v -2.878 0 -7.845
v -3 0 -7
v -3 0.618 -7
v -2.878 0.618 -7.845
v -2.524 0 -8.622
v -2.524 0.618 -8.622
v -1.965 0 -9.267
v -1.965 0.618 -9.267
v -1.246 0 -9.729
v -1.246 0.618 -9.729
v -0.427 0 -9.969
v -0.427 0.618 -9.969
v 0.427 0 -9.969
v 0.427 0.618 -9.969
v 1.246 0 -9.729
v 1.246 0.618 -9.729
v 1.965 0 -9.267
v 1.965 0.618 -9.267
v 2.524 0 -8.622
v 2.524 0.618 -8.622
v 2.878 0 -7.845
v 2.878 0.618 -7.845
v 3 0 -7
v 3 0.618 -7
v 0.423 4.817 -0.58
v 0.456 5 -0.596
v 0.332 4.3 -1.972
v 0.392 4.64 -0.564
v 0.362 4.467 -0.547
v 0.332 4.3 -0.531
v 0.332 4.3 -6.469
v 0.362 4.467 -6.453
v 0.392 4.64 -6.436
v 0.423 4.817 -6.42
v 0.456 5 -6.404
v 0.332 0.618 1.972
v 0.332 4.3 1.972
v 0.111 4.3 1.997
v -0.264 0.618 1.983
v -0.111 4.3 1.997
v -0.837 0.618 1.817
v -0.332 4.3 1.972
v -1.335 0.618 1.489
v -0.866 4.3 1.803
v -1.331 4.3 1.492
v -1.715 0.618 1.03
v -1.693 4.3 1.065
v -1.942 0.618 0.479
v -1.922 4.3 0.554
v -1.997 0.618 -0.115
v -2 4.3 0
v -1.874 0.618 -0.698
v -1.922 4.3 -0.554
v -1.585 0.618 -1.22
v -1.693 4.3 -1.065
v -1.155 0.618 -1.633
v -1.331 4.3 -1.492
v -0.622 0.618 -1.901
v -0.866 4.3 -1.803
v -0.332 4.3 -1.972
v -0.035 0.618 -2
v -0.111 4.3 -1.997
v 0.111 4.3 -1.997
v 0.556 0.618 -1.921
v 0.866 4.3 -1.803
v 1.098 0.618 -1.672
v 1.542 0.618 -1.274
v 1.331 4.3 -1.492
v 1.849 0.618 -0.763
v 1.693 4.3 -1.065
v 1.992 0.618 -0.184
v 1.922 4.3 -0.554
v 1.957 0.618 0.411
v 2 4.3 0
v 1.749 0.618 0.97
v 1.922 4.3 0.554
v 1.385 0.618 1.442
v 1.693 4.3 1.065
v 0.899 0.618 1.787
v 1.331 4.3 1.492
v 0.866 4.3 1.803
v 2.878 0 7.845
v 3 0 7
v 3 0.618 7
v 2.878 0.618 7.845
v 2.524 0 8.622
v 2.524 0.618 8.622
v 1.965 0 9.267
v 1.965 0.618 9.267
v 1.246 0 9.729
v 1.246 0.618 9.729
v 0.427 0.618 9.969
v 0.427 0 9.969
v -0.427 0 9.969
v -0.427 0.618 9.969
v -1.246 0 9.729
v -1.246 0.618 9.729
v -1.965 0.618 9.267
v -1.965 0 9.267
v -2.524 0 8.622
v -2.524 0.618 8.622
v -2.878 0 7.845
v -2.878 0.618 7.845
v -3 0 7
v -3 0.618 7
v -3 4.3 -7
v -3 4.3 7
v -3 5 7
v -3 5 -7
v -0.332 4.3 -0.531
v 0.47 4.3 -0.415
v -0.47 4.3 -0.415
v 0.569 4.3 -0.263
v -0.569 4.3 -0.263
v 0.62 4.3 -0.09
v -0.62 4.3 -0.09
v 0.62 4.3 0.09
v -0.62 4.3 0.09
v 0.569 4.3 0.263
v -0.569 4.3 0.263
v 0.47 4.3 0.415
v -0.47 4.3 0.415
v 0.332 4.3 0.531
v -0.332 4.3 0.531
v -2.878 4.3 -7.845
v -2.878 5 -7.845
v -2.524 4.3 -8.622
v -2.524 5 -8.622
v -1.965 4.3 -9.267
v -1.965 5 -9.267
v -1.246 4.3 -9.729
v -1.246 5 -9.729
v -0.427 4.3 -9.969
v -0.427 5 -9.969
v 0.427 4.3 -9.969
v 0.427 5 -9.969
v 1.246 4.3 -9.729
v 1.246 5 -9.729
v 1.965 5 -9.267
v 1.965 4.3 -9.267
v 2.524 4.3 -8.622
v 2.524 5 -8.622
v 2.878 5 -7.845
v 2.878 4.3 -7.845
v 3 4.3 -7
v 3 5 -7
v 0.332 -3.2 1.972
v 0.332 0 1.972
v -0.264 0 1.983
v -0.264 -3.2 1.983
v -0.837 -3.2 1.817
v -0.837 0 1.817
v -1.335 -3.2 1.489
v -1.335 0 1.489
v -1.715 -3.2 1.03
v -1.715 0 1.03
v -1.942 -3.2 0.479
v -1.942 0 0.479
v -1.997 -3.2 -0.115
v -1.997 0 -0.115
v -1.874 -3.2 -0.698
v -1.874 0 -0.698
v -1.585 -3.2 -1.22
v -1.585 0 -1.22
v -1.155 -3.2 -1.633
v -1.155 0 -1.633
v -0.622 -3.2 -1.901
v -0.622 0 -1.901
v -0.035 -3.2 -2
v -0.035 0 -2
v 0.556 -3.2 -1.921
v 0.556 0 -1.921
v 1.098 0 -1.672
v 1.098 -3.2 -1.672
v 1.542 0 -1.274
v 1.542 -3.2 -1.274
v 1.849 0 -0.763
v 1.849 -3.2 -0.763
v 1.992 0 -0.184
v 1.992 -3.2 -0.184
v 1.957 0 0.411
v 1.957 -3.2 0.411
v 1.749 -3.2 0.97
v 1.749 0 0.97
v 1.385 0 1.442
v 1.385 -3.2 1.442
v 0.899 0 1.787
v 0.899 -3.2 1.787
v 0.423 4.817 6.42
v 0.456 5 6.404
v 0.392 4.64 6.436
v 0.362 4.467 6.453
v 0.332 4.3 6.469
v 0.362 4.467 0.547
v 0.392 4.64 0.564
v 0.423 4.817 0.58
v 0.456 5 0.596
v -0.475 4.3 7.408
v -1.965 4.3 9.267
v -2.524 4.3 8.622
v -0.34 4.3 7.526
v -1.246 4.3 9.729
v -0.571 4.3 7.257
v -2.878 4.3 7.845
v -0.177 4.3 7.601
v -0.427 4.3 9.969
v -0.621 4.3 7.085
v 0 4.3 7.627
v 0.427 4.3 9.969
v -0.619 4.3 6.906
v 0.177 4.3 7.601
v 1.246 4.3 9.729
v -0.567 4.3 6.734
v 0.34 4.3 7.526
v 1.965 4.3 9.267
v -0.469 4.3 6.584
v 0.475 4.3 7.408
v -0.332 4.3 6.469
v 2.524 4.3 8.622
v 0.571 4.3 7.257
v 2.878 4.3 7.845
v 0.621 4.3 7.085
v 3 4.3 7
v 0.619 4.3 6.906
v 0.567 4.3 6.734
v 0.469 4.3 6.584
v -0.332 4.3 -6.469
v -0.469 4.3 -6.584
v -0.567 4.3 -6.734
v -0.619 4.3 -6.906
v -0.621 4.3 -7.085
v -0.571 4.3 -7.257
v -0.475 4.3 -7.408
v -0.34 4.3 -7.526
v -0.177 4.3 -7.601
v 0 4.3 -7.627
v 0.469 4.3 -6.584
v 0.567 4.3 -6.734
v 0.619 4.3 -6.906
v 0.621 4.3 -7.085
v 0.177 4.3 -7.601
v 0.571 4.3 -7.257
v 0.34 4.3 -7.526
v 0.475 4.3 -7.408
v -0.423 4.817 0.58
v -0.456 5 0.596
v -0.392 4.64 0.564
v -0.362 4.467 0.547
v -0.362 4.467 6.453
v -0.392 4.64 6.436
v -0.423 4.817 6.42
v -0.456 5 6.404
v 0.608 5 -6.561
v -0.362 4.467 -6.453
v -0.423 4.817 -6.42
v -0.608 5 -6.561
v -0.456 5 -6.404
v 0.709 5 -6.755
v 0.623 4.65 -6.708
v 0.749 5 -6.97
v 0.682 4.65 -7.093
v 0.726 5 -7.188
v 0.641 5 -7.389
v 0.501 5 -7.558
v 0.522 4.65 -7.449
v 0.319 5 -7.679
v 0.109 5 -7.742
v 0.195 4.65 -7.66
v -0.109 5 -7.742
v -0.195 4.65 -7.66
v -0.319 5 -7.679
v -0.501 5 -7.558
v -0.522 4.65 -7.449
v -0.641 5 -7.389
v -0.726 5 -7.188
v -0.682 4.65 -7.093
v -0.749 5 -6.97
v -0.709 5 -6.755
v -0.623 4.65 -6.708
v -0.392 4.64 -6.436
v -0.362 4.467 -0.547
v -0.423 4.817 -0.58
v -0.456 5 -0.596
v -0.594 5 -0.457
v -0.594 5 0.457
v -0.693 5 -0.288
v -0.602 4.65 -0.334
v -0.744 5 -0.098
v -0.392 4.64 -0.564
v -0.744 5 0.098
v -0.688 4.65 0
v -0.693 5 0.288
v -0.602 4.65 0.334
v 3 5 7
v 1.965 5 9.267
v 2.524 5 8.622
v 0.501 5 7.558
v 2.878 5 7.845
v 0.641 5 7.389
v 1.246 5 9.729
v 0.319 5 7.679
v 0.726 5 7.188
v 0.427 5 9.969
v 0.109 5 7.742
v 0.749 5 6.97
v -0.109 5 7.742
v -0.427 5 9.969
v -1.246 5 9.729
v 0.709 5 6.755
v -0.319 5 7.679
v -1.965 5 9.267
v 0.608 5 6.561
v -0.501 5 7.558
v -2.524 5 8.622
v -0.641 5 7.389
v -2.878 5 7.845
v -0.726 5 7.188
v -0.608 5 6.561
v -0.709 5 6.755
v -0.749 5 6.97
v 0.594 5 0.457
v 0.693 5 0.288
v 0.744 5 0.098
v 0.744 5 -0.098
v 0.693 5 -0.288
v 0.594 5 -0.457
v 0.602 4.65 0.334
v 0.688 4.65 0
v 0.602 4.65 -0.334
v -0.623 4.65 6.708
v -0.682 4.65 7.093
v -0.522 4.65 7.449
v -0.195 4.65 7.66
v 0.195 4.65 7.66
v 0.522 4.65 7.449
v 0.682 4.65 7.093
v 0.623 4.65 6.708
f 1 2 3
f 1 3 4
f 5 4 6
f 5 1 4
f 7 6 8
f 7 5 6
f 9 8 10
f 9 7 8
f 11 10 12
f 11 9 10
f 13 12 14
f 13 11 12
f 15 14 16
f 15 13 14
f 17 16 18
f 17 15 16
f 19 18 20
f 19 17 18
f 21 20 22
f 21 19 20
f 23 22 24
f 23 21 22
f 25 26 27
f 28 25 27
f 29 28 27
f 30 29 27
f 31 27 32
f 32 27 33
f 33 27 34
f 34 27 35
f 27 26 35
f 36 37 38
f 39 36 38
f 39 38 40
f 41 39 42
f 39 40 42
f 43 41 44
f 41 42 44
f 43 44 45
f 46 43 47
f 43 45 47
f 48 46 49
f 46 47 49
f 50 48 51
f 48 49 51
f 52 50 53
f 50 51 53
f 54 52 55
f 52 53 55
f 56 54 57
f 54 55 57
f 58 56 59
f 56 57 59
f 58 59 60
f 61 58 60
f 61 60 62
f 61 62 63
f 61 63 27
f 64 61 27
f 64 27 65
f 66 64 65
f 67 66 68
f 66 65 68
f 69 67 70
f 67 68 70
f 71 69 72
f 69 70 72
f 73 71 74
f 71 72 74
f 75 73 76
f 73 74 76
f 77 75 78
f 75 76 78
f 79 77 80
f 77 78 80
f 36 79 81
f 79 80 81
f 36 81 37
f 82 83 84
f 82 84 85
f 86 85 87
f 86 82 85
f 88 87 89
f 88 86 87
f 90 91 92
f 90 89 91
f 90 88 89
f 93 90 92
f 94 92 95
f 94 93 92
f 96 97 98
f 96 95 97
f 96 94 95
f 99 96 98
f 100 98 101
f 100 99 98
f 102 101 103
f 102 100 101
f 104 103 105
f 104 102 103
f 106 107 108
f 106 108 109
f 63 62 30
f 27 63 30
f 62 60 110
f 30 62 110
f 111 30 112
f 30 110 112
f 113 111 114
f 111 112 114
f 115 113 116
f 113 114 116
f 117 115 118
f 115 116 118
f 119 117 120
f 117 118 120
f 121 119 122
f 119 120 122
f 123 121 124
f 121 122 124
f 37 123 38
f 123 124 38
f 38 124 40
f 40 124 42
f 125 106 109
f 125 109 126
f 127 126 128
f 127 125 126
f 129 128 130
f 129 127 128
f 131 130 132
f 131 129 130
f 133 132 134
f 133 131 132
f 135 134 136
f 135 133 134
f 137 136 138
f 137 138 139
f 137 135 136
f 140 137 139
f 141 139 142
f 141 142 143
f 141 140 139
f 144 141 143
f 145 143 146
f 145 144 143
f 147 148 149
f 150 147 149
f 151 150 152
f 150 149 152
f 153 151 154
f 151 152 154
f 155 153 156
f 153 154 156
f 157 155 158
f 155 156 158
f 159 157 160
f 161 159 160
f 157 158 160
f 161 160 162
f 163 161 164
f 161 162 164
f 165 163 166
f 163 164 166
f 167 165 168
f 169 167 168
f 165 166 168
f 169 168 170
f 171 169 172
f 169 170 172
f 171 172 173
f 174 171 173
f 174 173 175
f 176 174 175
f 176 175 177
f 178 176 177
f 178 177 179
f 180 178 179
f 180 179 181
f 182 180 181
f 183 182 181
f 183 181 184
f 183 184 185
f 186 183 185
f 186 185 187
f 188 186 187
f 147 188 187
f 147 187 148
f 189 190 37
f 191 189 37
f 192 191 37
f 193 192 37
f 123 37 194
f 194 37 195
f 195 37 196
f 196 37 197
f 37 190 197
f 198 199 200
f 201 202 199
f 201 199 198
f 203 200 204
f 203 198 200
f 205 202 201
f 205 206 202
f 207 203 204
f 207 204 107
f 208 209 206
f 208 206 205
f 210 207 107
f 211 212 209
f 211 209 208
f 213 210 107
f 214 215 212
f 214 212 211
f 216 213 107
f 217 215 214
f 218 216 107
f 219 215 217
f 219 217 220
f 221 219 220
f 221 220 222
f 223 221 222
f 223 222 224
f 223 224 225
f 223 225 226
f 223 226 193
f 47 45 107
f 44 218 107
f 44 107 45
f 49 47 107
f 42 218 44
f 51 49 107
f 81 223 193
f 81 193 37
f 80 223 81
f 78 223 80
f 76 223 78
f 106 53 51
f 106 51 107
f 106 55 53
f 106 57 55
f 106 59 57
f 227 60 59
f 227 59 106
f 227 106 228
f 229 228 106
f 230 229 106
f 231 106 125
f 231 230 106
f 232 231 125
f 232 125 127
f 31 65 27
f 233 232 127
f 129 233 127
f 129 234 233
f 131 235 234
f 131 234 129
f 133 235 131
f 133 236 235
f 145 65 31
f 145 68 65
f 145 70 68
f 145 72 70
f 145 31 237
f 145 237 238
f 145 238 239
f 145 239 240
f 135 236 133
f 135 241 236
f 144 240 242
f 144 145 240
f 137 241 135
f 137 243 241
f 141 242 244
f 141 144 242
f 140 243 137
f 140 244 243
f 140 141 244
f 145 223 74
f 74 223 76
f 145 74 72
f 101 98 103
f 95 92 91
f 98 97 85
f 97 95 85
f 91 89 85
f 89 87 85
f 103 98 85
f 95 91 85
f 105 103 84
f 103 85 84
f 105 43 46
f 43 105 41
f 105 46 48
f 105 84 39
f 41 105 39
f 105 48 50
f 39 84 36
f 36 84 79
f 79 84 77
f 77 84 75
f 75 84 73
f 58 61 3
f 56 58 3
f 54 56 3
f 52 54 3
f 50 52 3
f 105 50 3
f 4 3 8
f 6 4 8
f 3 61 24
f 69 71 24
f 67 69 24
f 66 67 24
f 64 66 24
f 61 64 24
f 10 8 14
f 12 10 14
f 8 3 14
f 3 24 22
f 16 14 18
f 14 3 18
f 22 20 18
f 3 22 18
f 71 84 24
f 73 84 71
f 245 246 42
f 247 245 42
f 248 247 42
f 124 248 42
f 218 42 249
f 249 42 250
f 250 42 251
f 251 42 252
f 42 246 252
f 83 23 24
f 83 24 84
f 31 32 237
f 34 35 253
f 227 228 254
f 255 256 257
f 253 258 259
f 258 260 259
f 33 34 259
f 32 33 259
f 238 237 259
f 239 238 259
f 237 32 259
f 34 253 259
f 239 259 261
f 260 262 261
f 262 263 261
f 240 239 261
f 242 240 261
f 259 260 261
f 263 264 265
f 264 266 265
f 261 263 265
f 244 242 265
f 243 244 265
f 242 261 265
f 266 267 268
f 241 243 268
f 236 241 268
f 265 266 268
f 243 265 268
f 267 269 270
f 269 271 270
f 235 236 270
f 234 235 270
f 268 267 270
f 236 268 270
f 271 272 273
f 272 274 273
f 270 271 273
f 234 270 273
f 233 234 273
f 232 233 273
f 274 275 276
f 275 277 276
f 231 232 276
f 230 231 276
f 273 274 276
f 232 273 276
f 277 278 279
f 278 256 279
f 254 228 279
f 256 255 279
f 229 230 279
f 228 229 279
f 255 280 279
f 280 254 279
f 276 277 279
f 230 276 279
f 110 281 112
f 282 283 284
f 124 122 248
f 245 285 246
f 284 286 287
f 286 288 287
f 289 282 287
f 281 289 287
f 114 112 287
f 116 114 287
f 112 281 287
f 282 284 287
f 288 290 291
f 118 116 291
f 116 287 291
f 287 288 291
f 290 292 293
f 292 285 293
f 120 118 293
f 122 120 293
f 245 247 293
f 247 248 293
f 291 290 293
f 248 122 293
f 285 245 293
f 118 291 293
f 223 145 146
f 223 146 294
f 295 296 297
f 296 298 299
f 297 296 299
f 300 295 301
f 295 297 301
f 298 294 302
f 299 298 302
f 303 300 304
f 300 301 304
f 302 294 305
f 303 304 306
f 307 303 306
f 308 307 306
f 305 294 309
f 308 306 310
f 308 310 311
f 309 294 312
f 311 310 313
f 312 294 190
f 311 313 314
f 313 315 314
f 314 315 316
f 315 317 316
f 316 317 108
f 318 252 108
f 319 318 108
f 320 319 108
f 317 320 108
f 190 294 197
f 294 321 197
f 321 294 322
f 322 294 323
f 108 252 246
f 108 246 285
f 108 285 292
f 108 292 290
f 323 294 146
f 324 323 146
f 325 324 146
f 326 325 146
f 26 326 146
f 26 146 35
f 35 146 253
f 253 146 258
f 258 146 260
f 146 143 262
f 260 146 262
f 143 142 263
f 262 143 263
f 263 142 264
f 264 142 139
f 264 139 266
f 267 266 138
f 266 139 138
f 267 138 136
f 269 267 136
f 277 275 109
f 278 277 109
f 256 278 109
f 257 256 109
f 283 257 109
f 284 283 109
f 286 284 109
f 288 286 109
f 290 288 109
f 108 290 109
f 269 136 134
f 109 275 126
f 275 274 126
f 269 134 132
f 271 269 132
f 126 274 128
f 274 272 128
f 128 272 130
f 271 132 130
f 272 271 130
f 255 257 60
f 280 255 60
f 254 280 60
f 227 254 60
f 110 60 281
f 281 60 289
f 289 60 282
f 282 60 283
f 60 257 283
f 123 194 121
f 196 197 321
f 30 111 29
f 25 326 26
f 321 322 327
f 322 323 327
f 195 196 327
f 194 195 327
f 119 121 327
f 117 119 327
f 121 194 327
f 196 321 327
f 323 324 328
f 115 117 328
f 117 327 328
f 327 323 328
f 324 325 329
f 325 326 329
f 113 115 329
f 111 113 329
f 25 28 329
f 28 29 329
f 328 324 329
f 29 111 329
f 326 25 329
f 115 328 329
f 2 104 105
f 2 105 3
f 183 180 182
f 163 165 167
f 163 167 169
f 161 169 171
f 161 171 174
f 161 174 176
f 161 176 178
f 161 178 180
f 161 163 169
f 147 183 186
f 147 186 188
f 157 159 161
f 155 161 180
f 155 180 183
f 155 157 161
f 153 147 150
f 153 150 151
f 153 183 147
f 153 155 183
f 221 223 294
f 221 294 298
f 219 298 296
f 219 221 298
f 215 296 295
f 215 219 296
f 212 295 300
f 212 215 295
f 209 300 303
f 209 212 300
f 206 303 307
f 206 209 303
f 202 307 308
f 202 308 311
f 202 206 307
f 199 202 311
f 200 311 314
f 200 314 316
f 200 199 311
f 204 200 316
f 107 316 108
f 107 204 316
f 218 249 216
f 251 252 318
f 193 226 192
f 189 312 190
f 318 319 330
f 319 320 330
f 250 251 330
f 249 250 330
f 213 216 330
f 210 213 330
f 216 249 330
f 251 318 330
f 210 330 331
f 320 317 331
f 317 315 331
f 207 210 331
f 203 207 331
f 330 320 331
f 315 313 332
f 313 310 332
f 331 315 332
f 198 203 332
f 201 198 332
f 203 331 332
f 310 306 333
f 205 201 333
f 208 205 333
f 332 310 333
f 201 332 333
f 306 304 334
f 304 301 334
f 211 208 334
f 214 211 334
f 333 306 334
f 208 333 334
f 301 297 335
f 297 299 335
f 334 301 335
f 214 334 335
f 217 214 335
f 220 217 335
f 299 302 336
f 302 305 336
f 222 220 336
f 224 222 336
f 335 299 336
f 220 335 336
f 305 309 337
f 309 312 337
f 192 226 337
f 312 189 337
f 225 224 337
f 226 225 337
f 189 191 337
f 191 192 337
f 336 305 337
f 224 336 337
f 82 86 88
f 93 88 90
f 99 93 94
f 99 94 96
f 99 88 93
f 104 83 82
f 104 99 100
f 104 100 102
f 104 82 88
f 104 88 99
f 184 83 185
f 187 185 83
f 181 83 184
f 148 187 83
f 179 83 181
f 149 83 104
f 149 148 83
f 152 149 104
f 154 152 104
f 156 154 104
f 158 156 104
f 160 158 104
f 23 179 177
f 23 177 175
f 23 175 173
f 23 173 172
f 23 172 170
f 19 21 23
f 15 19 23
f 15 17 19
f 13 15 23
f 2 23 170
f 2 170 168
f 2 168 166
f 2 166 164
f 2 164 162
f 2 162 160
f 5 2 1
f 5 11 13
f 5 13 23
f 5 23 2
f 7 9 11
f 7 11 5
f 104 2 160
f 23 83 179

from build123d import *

# Parameters (mm, degrees)
SALIENTE_EXTRUIR1_DEPTH = 5
CORTAR_EXTRUIR1_DEPTH   = 1
CORTAR_EXTRUIR1_DRAFT   = -10
CROQUIS3_W              = 20
CROQUIS3_H              = 3.682271405
CORTAR_EXTRUIR3_DEPTH   = 13.68857754
CROQUIS4_R              = 2
SALIENTE_EXTRUIR2_DEPTH = 7.5


with BuildPart() as part:
    # Croquis1 → Saliente-Extruir1 (new body)
    with BuildSketch(Plane(origin=(0, 0, 0), x_dir=(1, 0, 0), z_dir=(0, 1, 0))):
        with BuildLine():
            Line((-3, -7), (-3, 7))
            ThreePointArc((-3, 7), (0, 10), (3, 7))
            Line((3, 7), (3, -7))
            ThreePointArc((3, -7), (0, -10), (-3, -7))
        make_face()
    extrude(amount=SALIENTE_EXTRUIR1_DEPTH)


with BuildPart() as cortar_extruir1_tool:
    # Croquis2 → Cortar-Extruir1 (with draft: the straight prism first)
    with BuildSketch(Plane(origin=(0, 5, 0), x_dir=(1, 0, 0), z_dir=(0, 1, 0))):
        with BuildLine():
            Line((-0.455587581, 6.404231625), (-0.455587581, 0.595768375))
            ThreePointArc((-0.455587581, 0.595768375), (-0.75, 0), (-0.455587581, -0.595768375))
            Line((-0.455587581, -0.595768375), (-0.455587581, -6.404231625))
            ThreePointArc((-0.455587581, -6.404231625), (0, -7.75), (0.455587581, -6.404231625))
            Line((0.455587581, -6.404231625), (0.455587581, -0.595768375))
            ThreePointArc((0.455587581, -0.595768375), (0.75, 0), (0.455587581, 0.595768375))
            Line((0.455587581, 0.595768375), (0.455587581, 6.404231625))
            ThreePointArc((0.455587581, 6.404231625), (0, 7.75), (-0.455587581, 6.404231625))
        make_face()
    extrude(amount=-CORTAR_EXTRUIR1_DEPTH)
    # Cortar-Extruir1: the draft: its side faces are tilted about the plane it starts from
    cortar_extruir1_sides = [cortar_extruir1_tool.faces().sort_by_distance(p)[0] for p in [
        (0, 4.5, -7.75),
        (-0.455587581, 4.5, -3.5),
        (-0.75, 4.5, 0),
        (-0.455587581, 4.5, 3.5),
        (0, 4.5, 7.75),
        (0.455587581, 4.5, 3.5),
        (0.75, 4.5, 0),
        (0.455587581, 4.5, -3.5),
    ]]
    draft(cortar_extruir1_sides, Plane(origin=(0, 5, 0), x_dir=(1, 0, 0), z_dir=(0, 1, 0)), CORTAR_EXTRUIR1_DRAFT)


with BuildPart() as part_1:
    add(part.part)

    # Cortar-Extruir1: cut by cortar_extruir1_tool
    add(cortar_extruir1_tool.part, mode=Mode.SUBTRACT)

    # Croquis3 → Cortar-Extruir3 (cut, through all)
    with BuildSketch(Plane(origin=(3, 0, 0), x_dir=(0, 0, -1), z_dir=(1, 0, 0))):
        with Locations((0, 2.458864298)):
            Rectangle(CROQUIS3_W, CROQUIS3_H)
    extrude(amount=-CORTAR_EXTRUIR3_DEPTH, mode=Mode.SUBTRACT)


with BuildPart() as cortar_extruir3_piece_1:
    # of the separate pieces the step leaves, piece 1, a body of its own (cortar_extruir3_pieces)
    add(part_1.part.solids().sort_by_distance((-3, 0, 7))[0])



with BuildPart() as cortar_extruir3_piece_2:
    # of the separate pieces the step leaves, piece 2, a body of its own (cortar_extruir3_pieces)
    add(part_1.part.solids().sort_by_distance((-3, 4.3, -7))[0])


with BuildPart() as cortar_extruir3_piece_1_1:
    add(cortar_extruir3_piece_1.part)

    add(cortar_extruir3_piece_2.part)  # Saliente-Extruir2 merges Cortar-Extruir3 piece 2
    # Croquis4 → Saliente-Extruir2 (add)
    with BuildSketch(Plane.XZ.offset(-4.3)):
        with Locations(Location((0, 0, 0), (0, 0, 80.440058332))):
            Circle(CROQUIS4_R)
    extrude(amount=SALIENTE_EXTRUIR2_DEPTH)


solid = cortar_extruir3_piece_1_1.part
